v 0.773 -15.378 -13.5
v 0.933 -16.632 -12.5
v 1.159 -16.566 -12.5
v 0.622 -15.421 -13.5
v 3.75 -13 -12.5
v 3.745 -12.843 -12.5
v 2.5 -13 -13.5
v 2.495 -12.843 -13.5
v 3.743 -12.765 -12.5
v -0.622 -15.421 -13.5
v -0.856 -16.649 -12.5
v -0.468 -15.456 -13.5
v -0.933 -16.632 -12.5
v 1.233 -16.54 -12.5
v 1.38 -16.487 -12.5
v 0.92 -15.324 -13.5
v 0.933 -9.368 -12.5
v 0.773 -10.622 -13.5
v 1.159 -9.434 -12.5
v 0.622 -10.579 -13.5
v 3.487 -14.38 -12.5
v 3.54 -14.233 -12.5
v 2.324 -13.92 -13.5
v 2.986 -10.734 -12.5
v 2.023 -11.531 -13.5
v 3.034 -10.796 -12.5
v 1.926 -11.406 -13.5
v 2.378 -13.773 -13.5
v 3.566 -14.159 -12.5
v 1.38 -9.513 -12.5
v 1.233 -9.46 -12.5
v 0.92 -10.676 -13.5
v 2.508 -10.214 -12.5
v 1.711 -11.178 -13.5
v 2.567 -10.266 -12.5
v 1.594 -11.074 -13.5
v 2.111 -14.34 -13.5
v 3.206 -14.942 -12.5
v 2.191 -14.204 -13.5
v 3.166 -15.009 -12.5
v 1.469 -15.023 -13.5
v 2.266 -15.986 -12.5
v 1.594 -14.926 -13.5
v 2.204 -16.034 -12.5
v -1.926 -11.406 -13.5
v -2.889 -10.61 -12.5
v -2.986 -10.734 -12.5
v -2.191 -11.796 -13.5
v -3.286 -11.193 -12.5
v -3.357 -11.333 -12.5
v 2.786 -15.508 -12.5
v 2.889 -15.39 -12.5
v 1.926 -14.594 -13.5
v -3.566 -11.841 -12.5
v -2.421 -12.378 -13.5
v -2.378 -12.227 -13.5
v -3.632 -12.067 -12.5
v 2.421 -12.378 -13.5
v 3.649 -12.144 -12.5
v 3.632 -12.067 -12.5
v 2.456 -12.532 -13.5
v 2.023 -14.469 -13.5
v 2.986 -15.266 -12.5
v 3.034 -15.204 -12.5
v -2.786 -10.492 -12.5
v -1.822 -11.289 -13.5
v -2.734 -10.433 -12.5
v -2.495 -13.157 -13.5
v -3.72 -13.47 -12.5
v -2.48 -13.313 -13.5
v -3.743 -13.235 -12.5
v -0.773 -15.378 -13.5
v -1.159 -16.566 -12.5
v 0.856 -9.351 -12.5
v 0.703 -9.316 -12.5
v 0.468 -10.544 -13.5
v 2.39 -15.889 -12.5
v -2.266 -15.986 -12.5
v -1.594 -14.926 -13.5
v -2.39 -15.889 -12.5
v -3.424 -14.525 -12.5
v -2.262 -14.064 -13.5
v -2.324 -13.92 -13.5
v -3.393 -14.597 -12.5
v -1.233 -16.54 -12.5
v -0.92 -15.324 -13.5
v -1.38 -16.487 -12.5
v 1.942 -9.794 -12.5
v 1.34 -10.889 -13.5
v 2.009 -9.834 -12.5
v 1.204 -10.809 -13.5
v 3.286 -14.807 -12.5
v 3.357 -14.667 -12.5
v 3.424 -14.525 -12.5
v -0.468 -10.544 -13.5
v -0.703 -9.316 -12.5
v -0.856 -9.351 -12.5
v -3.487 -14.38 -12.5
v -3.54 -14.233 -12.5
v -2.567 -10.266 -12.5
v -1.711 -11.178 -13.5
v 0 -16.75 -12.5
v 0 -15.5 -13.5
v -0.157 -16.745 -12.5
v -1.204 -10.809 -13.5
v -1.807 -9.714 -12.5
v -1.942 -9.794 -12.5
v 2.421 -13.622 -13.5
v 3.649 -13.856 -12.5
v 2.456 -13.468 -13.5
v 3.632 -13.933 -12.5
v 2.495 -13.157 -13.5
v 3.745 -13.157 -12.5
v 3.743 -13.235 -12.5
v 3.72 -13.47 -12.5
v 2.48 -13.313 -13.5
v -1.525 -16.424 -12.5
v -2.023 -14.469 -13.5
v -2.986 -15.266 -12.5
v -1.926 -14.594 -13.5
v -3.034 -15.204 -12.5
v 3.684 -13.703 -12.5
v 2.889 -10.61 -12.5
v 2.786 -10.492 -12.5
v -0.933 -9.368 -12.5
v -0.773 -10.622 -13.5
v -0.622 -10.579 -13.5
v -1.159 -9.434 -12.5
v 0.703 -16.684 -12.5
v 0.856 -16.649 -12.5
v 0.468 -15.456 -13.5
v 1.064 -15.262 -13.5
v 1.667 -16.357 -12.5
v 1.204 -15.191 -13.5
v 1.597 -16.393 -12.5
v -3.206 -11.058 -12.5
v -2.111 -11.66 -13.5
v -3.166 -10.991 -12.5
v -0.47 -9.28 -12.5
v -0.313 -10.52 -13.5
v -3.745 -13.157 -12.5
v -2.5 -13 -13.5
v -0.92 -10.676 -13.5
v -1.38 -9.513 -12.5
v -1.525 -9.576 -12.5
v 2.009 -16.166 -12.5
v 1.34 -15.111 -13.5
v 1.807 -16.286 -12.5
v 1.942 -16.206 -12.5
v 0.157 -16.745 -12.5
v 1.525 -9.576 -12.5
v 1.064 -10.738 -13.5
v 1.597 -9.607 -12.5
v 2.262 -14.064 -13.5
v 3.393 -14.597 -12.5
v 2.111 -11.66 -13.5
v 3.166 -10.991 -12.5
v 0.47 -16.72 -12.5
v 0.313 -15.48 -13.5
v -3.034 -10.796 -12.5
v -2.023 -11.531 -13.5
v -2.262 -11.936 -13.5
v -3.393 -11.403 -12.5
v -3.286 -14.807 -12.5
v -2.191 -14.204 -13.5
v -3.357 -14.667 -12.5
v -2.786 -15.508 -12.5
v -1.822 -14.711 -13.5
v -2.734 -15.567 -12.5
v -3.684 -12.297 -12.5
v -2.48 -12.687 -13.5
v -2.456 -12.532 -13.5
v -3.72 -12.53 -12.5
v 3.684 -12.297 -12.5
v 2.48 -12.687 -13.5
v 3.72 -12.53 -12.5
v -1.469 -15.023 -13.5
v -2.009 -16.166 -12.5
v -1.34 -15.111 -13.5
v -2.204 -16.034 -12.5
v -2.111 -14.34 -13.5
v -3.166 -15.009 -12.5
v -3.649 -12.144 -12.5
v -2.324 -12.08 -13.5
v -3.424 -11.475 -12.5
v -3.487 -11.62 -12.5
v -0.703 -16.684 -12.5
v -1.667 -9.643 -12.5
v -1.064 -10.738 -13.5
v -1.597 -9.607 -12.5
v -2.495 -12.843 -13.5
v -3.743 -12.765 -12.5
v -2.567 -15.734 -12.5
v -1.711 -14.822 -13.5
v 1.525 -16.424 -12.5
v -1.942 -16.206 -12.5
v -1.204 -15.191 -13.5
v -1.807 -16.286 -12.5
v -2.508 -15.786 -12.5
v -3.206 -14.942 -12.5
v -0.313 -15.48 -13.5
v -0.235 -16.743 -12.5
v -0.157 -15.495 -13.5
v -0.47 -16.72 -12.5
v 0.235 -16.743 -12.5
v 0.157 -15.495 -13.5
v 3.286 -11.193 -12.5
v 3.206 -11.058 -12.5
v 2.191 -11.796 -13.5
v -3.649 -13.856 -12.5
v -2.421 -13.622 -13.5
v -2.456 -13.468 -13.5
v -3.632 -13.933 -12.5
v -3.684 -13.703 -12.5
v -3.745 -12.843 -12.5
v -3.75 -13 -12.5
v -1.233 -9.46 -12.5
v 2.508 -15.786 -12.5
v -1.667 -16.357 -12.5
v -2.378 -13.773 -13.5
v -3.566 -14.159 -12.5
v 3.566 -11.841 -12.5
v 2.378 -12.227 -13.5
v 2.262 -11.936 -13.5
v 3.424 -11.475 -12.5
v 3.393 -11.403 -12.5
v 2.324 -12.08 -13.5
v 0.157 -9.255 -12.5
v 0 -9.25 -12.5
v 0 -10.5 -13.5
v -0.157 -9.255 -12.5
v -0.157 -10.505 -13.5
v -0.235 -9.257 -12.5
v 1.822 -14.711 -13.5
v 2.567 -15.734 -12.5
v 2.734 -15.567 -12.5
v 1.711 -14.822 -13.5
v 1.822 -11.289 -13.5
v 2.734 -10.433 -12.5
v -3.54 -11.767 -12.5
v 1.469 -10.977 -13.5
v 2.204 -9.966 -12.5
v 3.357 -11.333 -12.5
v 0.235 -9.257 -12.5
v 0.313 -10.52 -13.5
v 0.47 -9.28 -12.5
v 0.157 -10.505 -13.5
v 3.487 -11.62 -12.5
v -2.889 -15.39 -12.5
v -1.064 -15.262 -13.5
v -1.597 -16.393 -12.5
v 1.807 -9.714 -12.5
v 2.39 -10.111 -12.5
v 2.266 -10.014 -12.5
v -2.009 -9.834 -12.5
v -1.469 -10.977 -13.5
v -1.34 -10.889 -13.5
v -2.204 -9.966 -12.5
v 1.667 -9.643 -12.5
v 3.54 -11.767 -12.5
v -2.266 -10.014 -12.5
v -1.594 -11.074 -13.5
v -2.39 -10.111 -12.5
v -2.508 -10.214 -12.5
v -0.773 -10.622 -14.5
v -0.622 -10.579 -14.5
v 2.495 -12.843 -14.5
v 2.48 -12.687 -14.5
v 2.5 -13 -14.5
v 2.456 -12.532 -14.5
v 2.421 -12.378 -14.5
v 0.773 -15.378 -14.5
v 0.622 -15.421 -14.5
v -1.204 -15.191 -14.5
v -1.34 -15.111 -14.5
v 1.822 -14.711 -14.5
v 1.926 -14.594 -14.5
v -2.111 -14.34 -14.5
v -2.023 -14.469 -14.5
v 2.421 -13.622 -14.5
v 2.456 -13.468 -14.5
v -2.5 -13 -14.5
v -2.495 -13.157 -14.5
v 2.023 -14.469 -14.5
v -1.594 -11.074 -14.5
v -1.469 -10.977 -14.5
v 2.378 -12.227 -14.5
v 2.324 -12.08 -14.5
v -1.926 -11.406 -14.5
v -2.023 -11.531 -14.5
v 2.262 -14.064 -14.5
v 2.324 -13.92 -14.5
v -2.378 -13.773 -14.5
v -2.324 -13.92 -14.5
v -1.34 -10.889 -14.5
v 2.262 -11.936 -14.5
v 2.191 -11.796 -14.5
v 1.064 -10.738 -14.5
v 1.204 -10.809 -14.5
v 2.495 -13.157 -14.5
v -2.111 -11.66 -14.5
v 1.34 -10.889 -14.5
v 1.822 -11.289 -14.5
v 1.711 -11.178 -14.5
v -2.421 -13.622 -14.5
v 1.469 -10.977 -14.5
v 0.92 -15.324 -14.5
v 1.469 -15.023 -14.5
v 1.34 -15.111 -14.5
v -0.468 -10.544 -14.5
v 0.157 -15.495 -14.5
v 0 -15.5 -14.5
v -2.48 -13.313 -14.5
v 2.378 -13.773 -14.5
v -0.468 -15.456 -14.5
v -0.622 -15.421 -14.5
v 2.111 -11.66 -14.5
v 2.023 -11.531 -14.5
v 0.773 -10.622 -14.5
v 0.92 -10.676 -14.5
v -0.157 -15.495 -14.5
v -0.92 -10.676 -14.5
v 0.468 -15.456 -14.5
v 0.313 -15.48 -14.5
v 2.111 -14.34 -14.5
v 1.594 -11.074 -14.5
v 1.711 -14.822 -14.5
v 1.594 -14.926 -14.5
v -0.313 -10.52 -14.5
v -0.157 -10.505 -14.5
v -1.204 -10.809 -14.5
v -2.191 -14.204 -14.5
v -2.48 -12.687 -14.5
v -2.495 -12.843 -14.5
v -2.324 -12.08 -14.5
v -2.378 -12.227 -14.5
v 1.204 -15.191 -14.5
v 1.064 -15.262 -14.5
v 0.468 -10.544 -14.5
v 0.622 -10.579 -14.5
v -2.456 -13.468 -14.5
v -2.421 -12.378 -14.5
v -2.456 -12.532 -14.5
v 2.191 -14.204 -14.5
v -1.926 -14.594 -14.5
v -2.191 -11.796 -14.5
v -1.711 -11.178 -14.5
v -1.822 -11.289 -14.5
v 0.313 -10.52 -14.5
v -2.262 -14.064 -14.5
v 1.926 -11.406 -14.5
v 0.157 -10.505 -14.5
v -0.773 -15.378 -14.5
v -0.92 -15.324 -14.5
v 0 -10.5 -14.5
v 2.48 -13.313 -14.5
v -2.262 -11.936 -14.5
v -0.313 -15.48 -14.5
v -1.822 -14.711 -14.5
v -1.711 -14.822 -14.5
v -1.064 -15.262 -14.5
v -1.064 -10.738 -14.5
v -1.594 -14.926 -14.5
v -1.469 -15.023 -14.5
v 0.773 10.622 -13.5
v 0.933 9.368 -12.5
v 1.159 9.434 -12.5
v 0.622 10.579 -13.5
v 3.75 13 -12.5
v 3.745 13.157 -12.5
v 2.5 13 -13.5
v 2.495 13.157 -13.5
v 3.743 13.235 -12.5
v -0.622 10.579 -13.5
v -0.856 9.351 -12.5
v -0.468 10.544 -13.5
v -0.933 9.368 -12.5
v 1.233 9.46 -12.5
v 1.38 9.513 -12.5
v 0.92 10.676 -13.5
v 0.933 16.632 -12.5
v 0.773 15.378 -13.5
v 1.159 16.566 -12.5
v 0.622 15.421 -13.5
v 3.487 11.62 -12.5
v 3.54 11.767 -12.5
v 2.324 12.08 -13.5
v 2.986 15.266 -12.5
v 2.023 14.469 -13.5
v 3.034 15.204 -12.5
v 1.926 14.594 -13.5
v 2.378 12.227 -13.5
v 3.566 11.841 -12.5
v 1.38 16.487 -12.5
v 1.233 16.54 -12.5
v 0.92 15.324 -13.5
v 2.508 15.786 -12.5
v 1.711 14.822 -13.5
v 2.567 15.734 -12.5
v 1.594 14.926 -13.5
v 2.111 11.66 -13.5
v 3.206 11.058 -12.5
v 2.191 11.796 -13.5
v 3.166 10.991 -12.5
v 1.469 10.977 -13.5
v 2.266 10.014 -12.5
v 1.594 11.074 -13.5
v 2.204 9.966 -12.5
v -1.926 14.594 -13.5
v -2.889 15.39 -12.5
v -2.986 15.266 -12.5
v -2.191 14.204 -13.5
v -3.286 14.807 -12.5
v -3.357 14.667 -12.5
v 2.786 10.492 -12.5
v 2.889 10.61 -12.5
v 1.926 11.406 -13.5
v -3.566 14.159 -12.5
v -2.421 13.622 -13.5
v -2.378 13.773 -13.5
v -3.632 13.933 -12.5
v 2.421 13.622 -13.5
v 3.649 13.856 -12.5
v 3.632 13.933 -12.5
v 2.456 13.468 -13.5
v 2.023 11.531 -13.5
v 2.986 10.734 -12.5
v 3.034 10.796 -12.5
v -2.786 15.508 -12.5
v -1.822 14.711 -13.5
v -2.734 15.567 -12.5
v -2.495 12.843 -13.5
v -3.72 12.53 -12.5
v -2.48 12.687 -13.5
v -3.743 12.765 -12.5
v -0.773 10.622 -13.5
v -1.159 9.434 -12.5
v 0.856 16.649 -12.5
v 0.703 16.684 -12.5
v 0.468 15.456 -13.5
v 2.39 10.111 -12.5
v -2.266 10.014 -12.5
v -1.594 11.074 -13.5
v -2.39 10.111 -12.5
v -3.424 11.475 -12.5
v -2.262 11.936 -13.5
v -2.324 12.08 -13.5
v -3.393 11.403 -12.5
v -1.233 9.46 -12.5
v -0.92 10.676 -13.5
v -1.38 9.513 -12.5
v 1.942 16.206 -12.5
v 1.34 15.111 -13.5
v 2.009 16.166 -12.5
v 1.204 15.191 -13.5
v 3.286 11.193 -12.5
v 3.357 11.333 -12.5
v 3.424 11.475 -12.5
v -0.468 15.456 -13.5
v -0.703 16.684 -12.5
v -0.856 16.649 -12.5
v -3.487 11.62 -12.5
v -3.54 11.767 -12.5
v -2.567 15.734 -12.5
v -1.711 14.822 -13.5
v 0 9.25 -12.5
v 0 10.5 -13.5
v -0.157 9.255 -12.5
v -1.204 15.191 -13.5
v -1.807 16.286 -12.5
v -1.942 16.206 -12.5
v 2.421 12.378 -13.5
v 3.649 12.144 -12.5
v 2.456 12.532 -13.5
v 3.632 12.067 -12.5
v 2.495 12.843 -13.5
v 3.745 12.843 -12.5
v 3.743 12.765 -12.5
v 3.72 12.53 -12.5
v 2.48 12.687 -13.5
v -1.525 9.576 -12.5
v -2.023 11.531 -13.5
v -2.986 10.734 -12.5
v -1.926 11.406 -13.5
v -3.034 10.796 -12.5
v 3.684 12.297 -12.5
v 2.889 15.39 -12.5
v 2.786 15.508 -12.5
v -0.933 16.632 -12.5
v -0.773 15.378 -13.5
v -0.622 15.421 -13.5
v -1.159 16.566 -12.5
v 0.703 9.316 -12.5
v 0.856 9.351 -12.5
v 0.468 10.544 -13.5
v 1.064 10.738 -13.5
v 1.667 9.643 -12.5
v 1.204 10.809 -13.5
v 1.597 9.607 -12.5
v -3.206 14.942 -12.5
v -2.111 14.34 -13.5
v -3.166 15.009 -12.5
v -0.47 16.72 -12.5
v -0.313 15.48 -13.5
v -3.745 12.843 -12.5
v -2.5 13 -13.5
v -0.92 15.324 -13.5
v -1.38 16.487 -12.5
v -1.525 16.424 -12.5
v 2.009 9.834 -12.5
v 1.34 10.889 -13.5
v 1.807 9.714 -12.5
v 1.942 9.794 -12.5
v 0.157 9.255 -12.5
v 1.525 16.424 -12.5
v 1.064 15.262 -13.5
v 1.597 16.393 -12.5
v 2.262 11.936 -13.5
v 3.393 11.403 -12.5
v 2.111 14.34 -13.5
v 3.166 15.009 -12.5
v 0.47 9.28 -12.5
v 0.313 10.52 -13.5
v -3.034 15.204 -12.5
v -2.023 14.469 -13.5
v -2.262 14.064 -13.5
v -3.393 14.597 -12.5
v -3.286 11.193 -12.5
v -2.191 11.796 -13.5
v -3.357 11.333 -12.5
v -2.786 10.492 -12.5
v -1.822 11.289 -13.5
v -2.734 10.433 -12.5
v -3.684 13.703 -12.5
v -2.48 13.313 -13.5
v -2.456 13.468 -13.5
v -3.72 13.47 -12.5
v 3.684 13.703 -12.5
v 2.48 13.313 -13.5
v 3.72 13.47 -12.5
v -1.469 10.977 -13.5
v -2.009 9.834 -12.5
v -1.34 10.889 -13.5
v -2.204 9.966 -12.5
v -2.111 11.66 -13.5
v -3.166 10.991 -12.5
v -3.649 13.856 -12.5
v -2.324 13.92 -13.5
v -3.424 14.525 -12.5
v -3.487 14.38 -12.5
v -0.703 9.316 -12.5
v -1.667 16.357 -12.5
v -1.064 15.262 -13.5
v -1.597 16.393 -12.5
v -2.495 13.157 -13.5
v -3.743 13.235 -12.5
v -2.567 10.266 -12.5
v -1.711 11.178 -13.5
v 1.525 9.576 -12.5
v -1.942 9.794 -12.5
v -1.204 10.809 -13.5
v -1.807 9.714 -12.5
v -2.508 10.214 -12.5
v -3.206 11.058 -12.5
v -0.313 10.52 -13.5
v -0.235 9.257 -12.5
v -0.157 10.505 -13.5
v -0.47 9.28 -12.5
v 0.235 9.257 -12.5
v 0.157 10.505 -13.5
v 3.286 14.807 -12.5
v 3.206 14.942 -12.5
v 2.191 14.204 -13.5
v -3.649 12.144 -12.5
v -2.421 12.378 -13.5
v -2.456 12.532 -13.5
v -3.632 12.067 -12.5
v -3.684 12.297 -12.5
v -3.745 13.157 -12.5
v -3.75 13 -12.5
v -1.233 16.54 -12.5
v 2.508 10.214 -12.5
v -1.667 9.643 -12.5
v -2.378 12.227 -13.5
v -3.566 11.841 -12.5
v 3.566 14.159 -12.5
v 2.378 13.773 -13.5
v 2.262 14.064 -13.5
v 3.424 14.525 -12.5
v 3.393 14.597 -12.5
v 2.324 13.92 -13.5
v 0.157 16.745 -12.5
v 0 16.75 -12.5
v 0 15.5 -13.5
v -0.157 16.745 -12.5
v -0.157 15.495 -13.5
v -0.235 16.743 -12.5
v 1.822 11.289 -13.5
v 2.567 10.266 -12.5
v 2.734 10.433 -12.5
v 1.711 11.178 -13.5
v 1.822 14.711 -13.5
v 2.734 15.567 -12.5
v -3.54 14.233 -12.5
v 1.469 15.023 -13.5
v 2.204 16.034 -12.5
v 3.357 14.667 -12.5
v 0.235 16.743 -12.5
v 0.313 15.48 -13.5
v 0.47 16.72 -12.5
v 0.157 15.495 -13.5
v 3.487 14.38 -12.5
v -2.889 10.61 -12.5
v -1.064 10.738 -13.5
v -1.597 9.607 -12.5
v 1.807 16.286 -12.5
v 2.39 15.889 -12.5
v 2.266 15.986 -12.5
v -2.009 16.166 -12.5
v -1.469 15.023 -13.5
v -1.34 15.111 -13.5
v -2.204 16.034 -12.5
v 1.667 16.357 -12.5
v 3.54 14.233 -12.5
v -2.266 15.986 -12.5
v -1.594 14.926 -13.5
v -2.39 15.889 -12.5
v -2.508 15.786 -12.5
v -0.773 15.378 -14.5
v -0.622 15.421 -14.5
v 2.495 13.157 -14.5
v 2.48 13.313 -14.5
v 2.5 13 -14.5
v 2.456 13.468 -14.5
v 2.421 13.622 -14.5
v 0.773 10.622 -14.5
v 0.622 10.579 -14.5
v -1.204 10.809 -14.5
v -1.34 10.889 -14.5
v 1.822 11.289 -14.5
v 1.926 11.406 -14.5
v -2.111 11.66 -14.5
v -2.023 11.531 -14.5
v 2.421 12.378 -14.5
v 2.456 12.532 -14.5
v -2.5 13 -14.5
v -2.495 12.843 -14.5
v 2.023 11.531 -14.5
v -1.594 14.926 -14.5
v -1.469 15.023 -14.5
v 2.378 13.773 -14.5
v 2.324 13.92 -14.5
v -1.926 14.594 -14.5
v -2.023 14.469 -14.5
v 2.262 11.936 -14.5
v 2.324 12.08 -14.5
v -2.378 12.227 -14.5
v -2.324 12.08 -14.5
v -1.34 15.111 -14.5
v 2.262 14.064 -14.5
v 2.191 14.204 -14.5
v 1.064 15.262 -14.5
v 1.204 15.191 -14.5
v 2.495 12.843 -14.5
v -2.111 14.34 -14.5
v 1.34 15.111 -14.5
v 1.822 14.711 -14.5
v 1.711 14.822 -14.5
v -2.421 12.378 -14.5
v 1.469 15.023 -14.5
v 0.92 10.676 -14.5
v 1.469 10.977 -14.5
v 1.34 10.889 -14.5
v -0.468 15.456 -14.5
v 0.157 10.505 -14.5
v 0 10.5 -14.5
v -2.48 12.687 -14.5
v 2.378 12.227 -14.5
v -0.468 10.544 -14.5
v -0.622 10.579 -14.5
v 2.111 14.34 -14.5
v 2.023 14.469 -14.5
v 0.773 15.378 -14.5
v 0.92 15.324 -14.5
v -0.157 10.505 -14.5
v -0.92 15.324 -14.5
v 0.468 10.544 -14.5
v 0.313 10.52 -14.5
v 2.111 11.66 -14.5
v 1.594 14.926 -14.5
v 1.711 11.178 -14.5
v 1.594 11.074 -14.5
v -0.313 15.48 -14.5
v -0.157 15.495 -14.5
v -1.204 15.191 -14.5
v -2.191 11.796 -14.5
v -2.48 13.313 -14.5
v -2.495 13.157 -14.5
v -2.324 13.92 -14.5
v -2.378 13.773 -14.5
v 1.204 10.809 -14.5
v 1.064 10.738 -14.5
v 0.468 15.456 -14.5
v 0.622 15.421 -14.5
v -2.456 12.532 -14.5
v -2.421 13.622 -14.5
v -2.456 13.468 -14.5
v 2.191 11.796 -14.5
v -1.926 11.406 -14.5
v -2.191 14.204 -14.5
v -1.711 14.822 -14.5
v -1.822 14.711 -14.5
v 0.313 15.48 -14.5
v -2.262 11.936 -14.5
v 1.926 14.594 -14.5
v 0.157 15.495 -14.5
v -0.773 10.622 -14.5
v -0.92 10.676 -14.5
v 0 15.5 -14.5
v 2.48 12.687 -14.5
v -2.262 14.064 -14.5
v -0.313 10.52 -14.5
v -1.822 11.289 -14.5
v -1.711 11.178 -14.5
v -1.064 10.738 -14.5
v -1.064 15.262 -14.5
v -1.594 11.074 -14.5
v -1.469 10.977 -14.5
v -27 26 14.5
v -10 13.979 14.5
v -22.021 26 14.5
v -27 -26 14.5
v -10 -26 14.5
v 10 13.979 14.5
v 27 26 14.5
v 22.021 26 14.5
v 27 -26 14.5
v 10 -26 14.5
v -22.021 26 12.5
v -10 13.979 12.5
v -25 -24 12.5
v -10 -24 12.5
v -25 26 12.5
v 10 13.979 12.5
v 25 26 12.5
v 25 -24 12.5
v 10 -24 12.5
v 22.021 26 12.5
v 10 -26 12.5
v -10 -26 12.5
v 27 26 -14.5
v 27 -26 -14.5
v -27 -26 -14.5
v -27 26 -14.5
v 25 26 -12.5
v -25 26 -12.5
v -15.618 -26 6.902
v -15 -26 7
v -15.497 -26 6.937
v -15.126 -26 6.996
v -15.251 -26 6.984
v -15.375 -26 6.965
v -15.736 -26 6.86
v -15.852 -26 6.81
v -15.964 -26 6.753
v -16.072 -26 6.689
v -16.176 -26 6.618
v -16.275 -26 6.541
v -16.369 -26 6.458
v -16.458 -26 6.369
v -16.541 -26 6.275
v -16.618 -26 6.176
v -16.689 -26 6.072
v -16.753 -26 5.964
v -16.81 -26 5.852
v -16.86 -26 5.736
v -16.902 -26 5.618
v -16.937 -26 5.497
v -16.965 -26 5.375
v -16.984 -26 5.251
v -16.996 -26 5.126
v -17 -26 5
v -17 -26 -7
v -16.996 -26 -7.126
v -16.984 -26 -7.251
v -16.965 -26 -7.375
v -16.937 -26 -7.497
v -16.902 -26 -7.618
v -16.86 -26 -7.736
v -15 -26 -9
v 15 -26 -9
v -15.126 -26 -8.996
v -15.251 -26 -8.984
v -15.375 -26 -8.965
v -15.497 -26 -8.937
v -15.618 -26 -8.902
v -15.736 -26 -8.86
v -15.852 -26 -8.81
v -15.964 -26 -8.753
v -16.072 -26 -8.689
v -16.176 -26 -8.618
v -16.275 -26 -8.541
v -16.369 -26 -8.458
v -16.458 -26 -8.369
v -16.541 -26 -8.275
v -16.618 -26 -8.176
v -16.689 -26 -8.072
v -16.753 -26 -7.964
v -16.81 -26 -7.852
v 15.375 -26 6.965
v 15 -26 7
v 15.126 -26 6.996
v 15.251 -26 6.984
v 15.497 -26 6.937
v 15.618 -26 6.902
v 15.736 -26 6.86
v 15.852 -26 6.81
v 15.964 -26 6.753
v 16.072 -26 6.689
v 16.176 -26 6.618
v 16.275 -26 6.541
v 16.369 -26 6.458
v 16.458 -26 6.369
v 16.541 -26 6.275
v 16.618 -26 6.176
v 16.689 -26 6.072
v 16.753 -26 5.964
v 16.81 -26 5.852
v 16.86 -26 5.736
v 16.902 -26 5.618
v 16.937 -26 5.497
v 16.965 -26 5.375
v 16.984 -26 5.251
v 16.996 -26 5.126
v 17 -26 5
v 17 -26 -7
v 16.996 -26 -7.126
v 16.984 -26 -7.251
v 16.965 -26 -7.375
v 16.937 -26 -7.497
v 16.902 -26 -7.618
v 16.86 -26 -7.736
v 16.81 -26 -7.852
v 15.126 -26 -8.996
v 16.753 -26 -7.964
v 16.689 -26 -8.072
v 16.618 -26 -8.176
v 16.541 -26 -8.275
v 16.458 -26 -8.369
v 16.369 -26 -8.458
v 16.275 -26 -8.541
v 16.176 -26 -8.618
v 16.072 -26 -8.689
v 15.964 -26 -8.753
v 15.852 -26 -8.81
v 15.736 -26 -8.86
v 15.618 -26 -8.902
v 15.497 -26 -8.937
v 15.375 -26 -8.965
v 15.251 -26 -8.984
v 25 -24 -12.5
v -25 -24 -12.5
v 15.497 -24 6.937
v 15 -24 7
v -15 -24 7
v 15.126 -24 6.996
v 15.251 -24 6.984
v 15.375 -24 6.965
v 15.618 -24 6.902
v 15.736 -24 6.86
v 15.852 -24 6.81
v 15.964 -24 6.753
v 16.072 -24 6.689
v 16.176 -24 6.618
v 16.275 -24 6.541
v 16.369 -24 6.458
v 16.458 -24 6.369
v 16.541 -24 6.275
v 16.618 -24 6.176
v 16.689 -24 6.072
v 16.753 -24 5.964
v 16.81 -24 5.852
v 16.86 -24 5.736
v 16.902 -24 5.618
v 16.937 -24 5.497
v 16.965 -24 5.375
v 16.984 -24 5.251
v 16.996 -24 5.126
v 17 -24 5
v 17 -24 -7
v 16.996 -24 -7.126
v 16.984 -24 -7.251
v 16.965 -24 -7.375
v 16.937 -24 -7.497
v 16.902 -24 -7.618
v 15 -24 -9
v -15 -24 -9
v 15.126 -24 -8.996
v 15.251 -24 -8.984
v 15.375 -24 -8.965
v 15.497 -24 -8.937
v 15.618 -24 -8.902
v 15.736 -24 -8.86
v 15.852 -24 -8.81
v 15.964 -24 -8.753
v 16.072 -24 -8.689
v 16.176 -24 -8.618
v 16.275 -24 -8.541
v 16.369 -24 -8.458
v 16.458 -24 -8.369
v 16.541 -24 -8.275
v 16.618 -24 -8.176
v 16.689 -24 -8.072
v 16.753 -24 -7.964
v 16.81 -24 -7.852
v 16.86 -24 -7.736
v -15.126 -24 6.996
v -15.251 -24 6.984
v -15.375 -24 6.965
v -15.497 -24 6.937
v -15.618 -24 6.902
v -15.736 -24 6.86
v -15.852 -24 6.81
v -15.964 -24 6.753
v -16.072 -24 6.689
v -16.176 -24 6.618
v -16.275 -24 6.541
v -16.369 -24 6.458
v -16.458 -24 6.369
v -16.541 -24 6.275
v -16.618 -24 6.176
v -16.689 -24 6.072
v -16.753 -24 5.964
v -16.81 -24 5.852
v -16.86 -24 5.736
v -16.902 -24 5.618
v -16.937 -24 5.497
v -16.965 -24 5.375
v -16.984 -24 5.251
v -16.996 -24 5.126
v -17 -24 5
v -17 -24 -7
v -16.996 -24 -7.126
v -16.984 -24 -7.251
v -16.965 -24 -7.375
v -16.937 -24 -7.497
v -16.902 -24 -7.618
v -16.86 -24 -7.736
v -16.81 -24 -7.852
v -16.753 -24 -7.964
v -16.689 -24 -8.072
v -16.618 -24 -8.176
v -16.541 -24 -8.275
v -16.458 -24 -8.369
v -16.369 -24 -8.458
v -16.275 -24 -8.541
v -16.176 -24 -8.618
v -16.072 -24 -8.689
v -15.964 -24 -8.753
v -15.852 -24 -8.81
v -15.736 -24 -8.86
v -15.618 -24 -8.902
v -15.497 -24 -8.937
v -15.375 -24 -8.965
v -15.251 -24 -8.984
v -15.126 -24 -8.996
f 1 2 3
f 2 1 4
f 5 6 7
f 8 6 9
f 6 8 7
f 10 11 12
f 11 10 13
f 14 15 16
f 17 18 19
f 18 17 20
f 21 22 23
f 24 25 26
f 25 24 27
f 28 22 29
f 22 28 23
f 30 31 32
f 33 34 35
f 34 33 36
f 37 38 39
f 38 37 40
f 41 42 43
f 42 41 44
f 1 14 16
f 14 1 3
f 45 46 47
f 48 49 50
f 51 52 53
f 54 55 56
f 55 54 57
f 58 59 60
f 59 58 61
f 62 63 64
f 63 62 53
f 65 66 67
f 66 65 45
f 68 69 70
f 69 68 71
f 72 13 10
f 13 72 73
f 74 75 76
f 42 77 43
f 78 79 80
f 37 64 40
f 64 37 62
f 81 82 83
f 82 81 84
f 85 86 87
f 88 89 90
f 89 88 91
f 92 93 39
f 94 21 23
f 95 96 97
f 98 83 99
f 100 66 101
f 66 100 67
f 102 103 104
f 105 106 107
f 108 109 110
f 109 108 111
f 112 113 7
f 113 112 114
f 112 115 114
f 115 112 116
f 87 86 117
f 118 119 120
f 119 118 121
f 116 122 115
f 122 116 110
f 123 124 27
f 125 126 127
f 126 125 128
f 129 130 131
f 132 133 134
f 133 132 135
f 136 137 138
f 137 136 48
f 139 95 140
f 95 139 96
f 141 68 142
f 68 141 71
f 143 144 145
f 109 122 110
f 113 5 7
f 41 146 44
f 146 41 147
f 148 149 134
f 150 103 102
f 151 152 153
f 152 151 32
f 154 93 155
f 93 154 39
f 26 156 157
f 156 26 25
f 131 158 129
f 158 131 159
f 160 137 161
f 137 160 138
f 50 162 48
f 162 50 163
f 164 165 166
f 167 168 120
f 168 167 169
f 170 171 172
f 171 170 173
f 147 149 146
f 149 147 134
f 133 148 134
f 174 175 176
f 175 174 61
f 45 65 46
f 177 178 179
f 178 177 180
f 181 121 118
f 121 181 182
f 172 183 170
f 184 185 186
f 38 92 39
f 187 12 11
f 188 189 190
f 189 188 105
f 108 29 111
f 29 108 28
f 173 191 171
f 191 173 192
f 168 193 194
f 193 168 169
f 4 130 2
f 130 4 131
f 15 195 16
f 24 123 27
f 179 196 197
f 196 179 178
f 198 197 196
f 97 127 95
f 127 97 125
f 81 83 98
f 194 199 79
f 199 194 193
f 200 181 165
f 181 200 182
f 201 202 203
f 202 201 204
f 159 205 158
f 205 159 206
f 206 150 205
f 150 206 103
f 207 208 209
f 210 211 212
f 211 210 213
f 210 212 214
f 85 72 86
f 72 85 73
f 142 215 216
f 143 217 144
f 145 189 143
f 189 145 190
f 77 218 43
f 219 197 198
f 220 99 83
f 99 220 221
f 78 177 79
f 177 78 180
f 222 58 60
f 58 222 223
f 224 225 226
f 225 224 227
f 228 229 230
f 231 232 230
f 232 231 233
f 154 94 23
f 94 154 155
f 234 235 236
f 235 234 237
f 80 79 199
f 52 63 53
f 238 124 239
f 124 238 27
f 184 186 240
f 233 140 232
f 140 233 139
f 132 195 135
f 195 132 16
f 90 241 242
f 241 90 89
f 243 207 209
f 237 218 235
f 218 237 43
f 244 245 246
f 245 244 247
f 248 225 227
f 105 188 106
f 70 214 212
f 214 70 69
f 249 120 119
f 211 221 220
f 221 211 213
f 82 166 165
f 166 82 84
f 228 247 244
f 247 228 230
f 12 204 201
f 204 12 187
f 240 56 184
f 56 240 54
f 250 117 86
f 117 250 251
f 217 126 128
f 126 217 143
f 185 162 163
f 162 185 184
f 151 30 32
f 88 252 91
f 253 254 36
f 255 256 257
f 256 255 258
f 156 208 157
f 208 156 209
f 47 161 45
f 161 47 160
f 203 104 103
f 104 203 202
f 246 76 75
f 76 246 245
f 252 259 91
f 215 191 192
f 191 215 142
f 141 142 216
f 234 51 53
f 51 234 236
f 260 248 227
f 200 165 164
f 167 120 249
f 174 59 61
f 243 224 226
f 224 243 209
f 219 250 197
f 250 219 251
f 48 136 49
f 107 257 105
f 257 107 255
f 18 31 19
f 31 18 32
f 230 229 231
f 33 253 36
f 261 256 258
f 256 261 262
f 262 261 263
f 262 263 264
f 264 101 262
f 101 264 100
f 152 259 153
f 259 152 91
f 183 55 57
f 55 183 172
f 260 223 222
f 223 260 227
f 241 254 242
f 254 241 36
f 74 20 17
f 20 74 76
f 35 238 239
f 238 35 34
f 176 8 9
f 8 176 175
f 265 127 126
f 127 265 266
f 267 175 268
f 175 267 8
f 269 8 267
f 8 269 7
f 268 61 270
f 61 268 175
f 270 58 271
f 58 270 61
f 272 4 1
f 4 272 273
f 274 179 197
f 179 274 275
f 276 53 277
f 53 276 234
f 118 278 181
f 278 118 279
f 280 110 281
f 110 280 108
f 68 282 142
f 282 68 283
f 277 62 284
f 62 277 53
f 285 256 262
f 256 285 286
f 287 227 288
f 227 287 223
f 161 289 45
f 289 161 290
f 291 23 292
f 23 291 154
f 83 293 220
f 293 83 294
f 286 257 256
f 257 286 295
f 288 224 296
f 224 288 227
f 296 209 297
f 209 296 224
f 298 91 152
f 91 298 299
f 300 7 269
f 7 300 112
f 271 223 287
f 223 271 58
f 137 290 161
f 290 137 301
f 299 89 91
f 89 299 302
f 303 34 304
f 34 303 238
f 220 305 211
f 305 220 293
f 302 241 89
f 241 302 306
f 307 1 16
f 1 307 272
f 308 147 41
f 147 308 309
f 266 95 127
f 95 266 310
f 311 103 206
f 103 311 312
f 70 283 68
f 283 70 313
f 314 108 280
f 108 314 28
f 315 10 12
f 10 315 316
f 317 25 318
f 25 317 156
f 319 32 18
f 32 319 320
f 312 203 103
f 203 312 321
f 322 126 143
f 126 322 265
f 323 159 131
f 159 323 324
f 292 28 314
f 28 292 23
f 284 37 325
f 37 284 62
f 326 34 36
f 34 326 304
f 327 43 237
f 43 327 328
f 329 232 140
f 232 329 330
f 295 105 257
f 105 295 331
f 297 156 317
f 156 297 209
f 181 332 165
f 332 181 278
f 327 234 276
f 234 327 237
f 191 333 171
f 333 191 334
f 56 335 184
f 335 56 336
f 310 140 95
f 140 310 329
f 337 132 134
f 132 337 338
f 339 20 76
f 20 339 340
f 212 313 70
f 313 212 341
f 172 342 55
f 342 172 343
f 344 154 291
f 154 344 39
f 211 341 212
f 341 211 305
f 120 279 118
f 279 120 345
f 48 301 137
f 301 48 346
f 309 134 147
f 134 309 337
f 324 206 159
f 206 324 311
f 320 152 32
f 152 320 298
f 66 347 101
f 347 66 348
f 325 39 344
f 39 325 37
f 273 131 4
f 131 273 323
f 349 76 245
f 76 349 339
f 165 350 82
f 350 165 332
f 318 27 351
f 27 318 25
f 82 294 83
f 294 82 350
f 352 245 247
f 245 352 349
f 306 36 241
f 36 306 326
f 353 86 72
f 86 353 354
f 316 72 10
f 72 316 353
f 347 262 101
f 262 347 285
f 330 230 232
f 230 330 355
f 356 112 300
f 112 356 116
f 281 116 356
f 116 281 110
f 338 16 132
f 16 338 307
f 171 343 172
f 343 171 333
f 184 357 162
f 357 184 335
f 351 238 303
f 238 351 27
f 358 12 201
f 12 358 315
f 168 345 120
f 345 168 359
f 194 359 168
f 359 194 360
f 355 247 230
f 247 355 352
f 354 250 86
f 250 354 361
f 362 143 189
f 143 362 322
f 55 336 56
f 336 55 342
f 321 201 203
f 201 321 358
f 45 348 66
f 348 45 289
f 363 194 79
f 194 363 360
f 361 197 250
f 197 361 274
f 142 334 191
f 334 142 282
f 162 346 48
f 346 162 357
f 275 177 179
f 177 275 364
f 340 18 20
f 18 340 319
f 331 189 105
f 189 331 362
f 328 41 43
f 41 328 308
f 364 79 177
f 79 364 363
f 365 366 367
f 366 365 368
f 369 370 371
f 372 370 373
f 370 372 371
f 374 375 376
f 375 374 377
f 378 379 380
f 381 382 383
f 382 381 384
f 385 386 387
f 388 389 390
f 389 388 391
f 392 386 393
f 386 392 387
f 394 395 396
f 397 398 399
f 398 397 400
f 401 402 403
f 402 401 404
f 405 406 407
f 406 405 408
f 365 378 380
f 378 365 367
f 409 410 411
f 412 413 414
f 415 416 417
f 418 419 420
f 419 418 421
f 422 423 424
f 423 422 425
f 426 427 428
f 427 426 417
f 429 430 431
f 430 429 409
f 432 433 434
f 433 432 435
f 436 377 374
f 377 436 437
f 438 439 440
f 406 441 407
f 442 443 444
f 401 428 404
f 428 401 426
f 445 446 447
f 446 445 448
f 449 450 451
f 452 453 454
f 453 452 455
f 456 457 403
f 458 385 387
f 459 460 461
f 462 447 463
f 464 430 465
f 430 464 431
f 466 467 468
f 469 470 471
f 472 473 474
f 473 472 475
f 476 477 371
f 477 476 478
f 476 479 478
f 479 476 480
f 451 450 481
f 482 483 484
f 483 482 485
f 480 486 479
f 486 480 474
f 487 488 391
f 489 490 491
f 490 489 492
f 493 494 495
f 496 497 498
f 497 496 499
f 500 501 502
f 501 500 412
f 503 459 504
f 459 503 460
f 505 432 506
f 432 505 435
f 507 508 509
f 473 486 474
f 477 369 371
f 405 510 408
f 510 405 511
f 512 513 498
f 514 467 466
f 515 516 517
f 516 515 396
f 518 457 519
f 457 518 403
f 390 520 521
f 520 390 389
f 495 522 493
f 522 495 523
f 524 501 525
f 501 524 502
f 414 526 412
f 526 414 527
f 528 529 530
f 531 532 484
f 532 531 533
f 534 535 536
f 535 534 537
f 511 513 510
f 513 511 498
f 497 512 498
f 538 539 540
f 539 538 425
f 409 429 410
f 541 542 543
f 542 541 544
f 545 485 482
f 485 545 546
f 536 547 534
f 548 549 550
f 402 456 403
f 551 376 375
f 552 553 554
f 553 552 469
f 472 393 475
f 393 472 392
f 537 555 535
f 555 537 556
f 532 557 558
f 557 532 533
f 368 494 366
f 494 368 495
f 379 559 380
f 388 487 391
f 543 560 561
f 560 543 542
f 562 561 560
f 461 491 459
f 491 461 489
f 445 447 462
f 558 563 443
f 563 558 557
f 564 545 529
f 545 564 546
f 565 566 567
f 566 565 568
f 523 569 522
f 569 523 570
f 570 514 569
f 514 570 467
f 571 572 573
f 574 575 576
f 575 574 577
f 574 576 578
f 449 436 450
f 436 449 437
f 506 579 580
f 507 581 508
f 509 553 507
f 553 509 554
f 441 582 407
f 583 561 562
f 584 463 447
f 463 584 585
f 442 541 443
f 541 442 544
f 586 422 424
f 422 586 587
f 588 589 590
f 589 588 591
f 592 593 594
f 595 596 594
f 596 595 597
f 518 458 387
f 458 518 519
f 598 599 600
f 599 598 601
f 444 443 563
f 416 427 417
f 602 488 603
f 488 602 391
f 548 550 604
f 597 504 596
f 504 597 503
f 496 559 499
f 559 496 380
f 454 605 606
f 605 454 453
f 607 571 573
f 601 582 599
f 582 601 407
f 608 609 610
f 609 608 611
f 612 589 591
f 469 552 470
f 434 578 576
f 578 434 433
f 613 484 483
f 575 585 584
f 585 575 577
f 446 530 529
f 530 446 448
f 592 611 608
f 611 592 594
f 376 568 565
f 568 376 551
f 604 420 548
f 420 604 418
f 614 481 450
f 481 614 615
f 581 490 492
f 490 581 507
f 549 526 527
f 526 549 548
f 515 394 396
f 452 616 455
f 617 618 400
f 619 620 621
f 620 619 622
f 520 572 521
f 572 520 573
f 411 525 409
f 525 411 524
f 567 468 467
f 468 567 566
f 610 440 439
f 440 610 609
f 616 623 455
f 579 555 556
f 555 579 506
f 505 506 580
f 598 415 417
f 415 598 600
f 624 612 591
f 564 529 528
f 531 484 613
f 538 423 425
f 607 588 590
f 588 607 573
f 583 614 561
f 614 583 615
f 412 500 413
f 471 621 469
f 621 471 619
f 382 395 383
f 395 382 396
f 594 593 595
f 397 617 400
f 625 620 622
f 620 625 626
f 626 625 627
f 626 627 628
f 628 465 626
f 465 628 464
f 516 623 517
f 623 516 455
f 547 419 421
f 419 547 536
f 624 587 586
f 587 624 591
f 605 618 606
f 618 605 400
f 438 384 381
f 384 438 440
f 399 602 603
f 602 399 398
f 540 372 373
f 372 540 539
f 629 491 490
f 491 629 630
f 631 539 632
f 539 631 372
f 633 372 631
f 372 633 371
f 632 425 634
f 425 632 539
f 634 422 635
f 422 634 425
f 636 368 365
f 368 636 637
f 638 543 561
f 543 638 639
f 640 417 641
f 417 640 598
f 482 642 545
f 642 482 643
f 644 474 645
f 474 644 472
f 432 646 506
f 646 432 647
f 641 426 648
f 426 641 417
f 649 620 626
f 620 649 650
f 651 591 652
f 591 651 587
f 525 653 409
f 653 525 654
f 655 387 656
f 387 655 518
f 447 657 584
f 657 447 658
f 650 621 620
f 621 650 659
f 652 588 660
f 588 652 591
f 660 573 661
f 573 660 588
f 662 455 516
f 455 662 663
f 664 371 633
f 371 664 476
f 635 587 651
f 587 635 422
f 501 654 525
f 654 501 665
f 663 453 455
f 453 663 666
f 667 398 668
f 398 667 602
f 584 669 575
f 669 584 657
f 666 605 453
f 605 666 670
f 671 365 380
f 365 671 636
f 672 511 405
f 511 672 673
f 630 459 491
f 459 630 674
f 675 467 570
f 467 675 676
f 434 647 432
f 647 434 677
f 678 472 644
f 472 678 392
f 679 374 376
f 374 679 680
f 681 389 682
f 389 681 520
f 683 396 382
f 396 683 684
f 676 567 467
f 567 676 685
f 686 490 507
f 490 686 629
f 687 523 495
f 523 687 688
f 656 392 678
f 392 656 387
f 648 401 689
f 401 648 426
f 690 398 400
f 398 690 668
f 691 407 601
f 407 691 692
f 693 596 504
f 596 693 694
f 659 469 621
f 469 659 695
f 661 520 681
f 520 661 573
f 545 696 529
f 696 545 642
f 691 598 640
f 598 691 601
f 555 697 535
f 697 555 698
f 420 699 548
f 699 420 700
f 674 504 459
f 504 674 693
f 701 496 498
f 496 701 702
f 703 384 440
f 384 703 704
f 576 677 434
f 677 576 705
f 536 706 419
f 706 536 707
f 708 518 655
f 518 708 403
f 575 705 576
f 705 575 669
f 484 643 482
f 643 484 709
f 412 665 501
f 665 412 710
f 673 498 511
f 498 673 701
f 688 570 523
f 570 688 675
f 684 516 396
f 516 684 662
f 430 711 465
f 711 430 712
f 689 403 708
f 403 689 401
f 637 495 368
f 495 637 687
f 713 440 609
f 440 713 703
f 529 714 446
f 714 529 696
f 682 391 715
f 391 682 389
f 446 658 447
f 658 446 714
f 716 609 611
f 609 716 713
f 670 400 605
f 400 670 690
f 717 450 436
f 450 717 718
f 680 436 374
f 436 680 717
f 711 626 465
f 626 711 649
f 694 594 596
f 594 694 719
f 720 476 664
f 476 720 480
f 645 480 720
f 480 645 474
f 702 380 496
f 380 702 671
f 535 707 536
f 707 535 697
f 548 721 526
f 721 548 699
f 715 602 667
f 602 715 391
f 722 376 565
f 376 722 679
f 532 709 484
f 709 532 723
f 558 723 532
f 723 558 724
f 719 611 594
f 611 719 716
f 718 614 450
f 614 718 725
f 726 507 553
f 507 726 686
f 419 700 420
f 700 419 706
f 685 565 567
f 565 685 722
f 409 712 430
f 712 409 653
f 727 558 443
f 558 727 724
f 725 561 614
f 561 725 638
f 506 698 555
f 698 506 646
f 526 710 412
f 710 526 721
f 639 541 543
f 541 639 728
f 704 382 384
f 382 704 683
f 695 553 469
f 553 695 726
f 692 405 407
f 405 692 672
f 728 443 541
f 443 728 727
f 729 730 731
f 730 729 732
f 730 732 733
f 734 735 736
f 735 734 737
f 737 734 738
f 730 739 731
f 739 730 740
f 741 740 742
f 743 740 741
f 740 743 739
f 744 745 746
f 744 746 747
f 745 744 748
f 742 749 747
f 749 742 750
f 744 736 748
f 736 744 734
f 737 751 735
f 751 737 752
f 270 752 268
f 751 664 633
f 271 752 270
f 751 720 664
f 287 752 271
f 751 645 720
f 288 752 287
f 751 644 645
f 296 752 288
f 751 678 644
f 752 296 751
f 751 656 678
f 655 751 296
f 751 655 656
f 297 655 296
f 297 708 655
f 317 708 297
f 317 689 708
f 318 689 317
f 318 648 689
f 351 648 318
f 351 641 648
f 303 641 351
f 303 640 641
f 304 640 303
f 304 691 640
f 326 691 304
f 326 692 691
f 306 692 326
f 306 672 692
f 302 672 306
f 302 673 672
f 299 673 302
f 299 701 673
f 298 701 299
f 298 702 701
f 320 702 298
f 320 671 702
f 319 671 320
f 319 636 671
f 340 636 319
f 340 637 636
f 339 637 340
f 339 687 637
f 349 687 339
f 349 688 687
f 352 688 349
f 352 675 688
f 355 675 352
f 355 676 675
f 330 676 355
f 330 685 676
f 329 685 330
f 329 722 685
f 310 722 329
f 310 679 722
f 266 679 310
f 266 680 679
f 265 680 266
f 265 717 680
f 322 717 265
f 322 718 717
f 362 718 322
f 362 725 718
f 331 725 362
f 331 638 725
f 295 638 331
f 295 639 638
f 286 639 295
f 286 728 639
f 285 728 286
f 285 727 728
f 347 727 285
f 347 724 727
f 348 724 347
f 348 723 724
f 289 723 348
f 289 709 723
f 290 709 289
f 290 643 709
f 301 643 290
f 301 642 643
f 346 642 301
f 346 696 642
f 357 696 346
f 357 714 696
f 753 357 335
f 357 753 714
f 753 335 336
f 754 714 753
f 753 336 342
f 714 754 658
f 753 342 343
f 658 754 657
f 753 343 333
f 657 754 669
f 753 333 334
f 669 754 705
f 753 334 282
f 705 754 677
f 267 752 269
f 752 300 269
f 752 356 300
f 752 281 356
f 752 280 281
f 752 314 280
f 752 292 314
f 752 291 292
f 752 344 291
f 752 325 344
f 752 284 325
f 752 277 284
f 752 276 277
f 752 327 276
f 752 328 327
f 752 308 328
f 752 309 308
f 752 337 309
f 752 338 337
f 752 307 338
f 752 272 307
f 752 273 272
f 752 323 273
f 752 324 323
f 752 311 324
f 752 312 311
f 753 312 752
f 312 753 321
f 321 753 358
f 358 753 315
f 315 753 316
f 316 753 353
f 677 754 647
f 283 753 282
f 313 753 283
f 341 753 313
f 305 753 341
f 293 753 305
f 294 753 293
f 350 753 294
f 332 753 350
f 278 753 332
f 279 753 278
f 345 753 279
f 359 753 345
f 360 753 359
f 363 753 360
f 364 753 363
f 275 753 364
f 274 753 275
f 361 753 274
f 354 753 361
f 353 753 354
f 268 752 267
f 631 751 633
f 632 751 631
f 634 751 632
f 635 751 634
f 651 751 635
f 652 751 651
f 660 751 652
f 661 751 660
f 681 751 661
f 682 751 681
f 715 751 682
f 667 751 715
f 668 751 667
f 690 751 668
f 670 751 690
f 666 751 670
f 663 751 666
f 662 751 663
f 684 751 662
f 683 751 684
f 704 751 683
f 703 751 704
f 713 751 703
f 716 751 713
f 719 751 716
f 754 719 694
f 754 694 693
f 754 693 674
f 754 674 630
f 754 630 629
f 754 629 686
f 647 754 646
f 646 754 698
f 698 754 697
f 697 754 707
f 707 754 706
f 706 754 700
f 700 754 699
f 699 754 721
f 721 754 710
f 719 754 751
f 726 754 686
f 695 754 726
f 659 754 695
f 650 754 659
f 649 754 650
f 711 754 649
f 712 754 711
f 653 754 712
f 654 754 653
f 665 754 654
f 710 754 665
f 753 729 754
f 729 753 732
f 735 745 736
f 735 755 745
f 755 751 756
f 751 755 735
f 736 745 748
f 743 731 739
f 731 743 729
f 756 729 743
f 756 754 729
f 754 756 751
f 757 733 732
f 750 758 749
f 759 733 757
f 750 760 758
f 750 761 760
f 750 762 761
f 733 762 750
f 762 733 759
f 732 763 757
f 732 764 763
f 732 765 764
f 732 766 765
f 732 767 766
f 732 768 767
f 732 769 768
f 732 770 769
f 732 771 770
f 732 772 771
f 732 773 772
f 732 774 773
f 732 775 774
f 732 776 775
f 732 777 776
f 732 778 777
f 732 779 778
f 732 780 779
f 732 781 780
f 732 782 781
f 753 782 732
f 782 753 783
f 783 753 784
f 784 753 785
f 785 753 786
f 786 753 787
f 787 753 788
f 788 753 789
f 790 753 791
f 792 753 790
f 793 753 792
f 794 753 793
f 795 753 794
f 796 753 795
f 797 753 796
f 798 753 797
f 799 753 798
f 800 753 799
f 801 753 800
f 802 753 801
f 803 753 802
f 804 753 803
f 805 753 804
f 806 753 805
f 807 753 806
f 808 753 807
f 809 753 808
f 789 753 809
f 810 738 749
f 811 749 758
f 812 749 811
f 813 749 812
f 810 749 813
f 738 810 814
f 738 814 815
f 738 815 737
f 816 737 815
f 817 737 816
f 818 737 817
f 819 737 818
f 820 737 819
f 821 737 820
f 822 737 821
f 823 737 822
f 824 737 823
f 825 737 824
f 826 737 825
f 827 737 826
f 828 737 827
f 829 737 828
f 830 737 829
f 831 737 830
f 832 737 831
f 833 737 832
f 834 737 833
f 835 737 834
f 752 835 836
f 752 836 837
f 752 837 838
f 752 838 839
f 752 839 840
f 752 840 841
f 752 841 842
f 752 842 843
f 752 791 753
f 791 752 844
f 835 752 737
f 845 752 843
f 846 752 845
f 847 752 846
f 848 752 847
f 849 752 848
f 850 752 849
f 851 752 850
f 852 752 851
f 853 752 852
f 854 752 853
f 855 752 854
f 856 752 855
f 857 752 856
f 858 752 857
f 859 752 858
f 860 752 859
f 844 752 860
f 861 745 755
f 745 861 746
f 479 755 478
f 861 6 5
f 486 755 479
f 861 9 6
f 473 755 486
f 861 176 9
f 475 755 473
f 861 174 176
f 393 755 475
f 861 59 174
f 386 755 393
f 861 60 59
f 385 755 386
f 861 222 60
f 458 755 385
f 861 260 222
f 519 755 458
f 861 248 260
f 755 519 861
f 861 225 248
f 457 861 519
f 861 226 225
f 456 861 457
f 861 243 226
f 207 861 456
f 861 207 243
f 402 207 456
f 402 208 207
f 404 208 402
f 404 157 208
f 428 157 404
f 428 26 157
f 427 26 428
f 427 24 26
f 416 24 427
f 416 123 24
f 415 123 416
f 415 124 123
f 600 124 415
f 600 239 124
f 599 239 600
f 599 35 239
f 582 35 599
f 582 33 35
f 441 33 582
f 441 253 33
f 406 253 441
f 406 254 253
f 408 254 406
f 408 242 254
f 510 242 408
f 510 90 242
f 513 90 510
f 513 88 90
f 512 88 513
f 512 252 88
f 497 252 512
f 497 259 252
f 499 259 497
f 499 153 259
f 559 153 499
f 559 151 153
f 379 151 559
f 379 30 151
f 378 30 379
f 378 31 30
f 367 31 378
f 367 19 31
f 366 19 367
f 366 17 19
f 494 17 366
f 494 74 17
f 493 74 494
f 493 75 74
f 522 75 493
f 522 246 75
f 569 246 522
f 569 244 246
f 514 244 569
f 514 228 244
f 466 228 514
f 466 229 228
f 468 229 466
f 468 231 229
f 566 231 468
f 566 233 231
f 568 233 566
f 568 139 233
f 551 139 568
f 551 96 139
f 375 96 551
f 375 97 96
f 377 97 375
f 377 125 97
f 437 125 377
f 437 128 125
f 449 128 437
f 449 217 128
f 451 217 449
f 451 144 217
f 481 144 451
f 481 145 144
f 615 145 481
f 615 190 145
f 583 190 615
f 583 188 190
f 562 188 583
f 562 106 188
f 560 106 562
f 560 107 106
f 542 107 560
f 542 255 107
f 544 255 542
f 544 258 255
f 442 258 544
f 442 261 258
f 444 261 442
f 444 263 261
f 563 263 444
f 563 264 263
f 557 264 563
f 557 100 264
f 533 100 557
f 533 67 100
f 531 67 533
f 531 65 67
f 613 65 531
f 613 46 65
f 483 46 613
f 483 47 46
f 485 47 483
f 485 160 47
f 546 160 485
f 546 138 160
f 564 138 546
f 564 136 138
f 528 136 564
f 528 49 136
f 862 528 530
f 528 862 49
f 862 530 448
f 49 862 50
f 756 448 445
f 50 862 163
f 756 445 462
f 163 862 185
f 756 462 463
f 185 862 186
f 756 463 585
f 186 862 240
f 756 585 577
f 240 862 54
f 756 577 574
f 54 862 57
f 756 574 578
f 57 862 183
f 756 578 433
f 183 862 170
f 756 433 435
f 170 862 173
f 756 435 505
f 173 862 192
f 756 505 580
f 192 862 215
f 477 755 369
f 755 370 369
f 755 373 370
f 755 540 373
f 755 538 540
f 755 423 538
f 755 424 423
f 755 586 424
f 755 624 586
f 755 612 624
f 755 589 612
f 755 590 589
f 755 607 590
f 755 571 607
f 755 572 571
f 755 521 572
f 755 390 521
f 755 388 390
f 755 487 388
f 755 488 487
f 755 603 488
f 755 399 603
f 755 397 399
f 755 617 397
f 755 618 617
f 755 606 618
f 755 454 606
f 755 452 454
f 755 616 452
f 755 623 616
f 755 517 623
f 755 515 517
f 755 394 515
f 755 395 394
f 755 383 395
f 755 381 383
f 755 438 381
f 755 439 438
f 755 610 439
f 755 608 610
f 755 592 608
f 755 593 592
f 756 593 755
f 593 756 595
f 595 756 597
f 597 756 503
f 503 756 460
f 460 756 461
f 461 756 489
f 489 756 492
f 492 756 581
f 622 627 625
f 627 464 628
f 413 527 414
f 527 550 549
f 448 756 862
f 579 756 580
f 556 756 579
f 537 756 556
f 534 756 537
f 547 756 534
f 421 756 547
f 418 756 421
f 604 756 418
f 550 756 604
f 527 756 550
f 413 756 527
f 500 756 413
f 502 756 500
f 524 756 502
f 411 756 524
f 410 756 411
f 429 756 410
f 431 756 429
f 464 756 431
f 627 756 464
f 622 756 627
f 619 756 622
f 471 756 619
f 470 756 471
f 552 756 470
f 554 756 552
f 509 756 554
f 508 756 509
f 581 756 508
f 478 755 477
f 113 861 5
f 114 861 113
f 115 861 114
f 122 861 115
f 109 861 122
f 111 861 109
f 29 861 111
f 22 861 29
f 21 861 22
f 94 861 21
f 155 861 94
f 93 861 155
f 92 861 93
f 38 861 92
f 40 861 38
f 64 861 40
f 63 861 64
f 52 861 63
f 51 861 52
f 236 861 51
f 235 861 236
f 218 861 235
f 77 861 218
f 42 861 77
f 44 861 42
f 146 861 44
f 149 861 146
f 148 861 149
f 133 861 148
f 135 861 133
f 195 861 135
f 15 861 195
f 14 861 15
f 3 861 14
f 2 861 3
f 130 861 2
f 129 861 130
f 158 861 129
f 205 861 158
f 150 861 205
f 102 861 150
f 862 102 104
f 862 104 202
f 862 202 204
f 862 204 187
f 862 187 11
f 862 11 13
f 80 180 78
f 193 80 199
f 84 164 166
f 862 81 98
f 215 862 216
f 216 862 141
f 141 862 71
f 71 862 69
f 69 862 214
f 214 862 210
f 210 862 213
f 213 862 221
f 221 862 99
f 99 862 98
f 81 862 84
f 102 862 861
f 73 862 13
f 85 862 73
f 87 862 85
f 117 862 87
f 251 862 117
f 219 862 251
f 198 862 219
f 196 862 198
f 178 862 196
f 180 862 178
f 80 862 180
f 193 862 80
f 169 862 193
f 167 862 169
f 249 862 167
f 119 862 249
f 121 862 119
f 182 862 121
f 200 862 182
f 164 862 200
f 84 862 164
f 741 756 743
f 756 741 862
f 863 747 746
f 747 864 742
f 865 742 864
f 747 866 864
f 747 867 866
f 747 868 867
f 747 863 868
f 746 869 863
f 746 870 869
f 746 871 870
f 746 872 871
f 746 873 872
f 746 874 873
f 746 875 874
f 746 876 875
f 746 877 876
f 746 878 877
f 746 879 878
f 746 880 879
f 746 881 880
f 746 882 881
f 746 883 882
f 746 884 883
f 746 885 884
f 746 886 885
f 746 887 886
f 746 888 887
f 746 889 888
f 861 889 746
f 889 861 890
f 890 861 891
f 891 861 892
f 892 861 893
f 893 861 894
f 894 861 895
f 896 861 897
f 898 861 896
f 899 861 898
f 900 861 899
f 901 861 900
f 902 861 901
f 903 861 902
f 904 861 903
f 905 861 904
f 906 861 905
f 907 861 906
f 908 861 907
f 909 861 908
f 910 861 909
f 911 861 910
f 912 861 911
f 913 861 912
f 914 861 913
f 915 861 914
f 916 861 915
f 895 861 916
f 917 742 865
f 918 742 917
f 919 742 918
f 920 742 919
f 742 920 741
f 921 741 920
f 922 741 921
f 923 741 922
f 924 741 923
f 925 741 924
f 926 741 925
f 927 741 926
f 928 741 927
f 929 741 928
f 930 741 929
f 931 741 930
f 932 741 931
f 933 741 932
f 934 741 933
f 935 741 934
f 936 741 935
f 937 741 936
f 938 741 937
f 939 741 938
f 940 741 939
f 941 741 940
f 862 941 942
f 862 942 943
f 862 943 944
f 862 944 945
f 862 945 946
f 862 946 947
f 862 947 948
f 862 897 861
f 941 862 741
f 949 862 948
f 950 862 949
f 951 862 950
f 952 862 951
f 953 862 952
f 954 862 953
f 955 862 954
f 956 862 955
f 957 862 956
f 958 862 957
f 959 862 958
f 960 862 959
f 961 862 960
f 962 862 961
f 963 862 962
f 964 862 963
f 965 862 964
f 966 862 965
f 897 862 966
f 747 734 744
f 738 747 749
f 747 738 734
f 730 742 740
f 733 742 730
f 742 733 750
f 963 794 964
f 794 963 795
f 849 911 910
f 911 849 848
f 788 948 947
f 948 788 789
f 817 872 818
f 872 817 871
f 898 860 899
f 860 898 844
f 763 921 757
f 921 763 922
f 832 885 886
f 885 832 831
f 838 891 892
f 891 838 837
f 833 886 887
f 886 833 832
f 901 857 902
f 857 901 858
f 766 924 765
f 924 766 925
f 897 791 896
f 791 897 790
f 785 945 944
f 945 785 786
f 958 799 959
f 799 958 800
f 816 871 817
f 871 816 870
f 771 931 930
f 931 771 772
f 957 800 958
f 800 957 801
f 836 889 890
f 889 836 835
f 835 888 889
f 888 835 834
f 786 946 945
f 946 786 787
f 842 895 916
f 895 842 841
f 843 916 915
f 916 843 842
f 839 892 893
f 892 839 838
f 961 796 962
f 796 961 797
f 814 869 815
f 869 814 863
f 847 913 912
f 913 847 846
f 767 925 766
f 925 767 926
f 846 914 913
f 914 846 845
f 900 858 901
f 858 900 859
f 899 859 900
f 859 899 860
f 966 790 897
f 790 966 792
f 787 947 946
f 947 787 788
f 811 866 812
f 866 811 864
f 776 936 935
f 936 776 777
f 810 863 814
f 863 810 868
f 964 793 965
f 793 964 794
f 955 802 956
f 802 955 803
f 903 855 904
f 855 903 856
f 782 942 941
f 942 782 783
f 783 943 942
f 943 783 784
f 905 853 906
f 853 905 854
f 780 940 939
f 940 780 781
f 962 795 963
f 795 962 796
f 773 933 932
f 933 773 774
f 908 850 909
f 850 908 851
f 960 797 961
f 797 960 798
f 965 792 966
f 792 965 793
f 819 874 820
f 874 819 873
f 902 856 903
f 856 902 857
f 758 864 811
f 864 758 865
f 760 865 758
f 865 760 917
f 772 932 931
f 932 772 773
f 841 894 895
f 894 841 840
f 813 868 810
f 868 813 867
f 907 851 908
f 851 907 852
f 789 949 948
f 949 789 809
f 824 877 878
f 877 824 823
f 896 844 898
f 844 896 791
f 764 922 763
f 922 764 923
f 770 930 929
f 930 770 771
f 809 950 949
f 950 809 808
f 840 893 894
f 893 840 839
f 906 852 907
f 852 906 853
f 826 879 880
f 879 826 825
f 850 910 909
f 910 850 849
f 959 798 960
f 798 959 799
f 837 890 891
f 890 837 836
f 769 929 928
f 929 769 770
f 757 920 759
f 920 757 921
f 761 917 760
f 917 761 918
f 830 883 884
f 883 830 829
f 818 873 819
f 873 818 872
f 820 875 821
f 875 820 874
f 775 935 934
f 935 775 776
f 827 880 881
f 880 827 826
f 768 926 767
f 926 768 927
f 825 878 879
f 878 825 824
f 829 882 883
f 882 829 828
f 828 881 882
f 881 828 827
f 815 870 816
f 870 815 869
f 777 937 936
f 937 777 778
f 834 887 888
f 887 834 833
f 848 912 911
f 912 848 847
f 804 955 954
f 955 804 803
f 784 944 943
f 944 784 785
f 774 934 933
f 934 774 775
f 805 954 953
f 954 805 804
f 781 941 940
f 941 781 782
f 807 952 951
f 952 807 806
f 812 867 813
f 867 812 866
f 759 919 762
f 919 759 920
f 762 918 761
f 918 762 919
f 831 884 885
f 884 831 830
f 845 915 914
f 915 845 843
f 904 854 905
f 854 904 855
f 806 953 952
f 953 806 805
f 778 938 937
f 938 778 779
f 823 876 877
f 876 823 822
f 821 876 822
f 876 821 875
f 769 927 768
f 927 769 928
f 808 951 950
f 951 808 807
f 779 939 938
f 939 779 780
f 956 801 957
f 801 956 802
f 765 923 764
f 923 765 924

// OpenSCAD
inner_width = 50;
inner_height = 50;
inner_depth = 25;

wall_thickness = 2;

hole_diameter = 5;

cutout_width = 20;
cutout_height = 70;

bottom_hole_width = 30;
bottom_hole_depth = 10;

container_width = inner_width + wall_thickness * 2;
container_height = inner_height + wall_thickness;
container_depth = inner_depth + wall_thickness * 2;

chamfer_size = (container_width - cutout_width)/2;
        
$fn = 100;

module bottom_hole() {
    if (bottom_hole_width > 0 && bottom_hole_depth > 2) {
        fillet = 2;
        d = bottom_hole_depth - fillet * 2;

        hull() {
            translate([ -bottom_hole_width / 2, wall_thickness / 2 - container_height/2, d - wall_thickness/2])
            rotate([-90, 0, 0])
            cylinder(h = wall_thickness, r = fillet, center = true);
            
            translate([ bottom_hole_width / 2, wall_thickness / 2 - container_height/2, d - wall_thickness/2])
            rotate([-90, 0, 0])
            cylinder(h = wall_thickness, r = fillet, center = true);

            translate([ -bottom_hole_width / 2, wall_thickness / 2 - container_height/2, -d - wall_thickness/2])
            rotate([-90, 0, 0])
            cylinder(h = wall_thickness, r = fillet, center = true);
            
            translate([ bottom_hole_width / 2, wall_thickness / 2 - container_height/2, -d - wall_thickness/2])
            rotate([-90, 0, 0])
            cylinder(h = wall_thickness, r = fillet, center = true);

        }
    }
}

module wall_mount_container() {
    difference() {
        // box
        cube([container_width, container_height, container_depth], center = true);
        
        translate([0, wall_thickness, 0])
            cube([container_width - 2*wall_thickness, container_height, container_depth - 2*wall_thickness], center = true);
            
        // holes
        for(i = [0 : 1]) {
            translate([0, (i*2 - 1) * container_height/4, -container_depth/2])
            union() {
                translate([0, 0, wall_thickness])
                cylinder(h = wall_thickness, d1 = hole_diameter, d2 = hole_diameter*2, center = true); 

                translate([0, 0, -wall_thickness/2])            
                cylinder(h = wall_thickness*2, d = hole_diameter, center = true);
            }
        }
        
        // front cutout
        translate([0, container_height/2 - cutout_height/2, container_depth/2])
        cube([cutout_width, cutout_height, wall_thickness * 2], center = true);
     
        // chamfer
        for(i = [0:1]) {
            translate([(i*2 - 1) * (container_width/2 - chamfer_size), container_height/2, container_depth/2 - wall_thickness/2])
            rotate([0, 0, 45])
            cube([chamfer_size, chamfer_size, wall_thickness], center = true);
        }
 
        bottom_hole();
    }
}


        
//translate([0, 0, container_height/2])
//rotate([90, 0, 0])
wall_mount_container();
